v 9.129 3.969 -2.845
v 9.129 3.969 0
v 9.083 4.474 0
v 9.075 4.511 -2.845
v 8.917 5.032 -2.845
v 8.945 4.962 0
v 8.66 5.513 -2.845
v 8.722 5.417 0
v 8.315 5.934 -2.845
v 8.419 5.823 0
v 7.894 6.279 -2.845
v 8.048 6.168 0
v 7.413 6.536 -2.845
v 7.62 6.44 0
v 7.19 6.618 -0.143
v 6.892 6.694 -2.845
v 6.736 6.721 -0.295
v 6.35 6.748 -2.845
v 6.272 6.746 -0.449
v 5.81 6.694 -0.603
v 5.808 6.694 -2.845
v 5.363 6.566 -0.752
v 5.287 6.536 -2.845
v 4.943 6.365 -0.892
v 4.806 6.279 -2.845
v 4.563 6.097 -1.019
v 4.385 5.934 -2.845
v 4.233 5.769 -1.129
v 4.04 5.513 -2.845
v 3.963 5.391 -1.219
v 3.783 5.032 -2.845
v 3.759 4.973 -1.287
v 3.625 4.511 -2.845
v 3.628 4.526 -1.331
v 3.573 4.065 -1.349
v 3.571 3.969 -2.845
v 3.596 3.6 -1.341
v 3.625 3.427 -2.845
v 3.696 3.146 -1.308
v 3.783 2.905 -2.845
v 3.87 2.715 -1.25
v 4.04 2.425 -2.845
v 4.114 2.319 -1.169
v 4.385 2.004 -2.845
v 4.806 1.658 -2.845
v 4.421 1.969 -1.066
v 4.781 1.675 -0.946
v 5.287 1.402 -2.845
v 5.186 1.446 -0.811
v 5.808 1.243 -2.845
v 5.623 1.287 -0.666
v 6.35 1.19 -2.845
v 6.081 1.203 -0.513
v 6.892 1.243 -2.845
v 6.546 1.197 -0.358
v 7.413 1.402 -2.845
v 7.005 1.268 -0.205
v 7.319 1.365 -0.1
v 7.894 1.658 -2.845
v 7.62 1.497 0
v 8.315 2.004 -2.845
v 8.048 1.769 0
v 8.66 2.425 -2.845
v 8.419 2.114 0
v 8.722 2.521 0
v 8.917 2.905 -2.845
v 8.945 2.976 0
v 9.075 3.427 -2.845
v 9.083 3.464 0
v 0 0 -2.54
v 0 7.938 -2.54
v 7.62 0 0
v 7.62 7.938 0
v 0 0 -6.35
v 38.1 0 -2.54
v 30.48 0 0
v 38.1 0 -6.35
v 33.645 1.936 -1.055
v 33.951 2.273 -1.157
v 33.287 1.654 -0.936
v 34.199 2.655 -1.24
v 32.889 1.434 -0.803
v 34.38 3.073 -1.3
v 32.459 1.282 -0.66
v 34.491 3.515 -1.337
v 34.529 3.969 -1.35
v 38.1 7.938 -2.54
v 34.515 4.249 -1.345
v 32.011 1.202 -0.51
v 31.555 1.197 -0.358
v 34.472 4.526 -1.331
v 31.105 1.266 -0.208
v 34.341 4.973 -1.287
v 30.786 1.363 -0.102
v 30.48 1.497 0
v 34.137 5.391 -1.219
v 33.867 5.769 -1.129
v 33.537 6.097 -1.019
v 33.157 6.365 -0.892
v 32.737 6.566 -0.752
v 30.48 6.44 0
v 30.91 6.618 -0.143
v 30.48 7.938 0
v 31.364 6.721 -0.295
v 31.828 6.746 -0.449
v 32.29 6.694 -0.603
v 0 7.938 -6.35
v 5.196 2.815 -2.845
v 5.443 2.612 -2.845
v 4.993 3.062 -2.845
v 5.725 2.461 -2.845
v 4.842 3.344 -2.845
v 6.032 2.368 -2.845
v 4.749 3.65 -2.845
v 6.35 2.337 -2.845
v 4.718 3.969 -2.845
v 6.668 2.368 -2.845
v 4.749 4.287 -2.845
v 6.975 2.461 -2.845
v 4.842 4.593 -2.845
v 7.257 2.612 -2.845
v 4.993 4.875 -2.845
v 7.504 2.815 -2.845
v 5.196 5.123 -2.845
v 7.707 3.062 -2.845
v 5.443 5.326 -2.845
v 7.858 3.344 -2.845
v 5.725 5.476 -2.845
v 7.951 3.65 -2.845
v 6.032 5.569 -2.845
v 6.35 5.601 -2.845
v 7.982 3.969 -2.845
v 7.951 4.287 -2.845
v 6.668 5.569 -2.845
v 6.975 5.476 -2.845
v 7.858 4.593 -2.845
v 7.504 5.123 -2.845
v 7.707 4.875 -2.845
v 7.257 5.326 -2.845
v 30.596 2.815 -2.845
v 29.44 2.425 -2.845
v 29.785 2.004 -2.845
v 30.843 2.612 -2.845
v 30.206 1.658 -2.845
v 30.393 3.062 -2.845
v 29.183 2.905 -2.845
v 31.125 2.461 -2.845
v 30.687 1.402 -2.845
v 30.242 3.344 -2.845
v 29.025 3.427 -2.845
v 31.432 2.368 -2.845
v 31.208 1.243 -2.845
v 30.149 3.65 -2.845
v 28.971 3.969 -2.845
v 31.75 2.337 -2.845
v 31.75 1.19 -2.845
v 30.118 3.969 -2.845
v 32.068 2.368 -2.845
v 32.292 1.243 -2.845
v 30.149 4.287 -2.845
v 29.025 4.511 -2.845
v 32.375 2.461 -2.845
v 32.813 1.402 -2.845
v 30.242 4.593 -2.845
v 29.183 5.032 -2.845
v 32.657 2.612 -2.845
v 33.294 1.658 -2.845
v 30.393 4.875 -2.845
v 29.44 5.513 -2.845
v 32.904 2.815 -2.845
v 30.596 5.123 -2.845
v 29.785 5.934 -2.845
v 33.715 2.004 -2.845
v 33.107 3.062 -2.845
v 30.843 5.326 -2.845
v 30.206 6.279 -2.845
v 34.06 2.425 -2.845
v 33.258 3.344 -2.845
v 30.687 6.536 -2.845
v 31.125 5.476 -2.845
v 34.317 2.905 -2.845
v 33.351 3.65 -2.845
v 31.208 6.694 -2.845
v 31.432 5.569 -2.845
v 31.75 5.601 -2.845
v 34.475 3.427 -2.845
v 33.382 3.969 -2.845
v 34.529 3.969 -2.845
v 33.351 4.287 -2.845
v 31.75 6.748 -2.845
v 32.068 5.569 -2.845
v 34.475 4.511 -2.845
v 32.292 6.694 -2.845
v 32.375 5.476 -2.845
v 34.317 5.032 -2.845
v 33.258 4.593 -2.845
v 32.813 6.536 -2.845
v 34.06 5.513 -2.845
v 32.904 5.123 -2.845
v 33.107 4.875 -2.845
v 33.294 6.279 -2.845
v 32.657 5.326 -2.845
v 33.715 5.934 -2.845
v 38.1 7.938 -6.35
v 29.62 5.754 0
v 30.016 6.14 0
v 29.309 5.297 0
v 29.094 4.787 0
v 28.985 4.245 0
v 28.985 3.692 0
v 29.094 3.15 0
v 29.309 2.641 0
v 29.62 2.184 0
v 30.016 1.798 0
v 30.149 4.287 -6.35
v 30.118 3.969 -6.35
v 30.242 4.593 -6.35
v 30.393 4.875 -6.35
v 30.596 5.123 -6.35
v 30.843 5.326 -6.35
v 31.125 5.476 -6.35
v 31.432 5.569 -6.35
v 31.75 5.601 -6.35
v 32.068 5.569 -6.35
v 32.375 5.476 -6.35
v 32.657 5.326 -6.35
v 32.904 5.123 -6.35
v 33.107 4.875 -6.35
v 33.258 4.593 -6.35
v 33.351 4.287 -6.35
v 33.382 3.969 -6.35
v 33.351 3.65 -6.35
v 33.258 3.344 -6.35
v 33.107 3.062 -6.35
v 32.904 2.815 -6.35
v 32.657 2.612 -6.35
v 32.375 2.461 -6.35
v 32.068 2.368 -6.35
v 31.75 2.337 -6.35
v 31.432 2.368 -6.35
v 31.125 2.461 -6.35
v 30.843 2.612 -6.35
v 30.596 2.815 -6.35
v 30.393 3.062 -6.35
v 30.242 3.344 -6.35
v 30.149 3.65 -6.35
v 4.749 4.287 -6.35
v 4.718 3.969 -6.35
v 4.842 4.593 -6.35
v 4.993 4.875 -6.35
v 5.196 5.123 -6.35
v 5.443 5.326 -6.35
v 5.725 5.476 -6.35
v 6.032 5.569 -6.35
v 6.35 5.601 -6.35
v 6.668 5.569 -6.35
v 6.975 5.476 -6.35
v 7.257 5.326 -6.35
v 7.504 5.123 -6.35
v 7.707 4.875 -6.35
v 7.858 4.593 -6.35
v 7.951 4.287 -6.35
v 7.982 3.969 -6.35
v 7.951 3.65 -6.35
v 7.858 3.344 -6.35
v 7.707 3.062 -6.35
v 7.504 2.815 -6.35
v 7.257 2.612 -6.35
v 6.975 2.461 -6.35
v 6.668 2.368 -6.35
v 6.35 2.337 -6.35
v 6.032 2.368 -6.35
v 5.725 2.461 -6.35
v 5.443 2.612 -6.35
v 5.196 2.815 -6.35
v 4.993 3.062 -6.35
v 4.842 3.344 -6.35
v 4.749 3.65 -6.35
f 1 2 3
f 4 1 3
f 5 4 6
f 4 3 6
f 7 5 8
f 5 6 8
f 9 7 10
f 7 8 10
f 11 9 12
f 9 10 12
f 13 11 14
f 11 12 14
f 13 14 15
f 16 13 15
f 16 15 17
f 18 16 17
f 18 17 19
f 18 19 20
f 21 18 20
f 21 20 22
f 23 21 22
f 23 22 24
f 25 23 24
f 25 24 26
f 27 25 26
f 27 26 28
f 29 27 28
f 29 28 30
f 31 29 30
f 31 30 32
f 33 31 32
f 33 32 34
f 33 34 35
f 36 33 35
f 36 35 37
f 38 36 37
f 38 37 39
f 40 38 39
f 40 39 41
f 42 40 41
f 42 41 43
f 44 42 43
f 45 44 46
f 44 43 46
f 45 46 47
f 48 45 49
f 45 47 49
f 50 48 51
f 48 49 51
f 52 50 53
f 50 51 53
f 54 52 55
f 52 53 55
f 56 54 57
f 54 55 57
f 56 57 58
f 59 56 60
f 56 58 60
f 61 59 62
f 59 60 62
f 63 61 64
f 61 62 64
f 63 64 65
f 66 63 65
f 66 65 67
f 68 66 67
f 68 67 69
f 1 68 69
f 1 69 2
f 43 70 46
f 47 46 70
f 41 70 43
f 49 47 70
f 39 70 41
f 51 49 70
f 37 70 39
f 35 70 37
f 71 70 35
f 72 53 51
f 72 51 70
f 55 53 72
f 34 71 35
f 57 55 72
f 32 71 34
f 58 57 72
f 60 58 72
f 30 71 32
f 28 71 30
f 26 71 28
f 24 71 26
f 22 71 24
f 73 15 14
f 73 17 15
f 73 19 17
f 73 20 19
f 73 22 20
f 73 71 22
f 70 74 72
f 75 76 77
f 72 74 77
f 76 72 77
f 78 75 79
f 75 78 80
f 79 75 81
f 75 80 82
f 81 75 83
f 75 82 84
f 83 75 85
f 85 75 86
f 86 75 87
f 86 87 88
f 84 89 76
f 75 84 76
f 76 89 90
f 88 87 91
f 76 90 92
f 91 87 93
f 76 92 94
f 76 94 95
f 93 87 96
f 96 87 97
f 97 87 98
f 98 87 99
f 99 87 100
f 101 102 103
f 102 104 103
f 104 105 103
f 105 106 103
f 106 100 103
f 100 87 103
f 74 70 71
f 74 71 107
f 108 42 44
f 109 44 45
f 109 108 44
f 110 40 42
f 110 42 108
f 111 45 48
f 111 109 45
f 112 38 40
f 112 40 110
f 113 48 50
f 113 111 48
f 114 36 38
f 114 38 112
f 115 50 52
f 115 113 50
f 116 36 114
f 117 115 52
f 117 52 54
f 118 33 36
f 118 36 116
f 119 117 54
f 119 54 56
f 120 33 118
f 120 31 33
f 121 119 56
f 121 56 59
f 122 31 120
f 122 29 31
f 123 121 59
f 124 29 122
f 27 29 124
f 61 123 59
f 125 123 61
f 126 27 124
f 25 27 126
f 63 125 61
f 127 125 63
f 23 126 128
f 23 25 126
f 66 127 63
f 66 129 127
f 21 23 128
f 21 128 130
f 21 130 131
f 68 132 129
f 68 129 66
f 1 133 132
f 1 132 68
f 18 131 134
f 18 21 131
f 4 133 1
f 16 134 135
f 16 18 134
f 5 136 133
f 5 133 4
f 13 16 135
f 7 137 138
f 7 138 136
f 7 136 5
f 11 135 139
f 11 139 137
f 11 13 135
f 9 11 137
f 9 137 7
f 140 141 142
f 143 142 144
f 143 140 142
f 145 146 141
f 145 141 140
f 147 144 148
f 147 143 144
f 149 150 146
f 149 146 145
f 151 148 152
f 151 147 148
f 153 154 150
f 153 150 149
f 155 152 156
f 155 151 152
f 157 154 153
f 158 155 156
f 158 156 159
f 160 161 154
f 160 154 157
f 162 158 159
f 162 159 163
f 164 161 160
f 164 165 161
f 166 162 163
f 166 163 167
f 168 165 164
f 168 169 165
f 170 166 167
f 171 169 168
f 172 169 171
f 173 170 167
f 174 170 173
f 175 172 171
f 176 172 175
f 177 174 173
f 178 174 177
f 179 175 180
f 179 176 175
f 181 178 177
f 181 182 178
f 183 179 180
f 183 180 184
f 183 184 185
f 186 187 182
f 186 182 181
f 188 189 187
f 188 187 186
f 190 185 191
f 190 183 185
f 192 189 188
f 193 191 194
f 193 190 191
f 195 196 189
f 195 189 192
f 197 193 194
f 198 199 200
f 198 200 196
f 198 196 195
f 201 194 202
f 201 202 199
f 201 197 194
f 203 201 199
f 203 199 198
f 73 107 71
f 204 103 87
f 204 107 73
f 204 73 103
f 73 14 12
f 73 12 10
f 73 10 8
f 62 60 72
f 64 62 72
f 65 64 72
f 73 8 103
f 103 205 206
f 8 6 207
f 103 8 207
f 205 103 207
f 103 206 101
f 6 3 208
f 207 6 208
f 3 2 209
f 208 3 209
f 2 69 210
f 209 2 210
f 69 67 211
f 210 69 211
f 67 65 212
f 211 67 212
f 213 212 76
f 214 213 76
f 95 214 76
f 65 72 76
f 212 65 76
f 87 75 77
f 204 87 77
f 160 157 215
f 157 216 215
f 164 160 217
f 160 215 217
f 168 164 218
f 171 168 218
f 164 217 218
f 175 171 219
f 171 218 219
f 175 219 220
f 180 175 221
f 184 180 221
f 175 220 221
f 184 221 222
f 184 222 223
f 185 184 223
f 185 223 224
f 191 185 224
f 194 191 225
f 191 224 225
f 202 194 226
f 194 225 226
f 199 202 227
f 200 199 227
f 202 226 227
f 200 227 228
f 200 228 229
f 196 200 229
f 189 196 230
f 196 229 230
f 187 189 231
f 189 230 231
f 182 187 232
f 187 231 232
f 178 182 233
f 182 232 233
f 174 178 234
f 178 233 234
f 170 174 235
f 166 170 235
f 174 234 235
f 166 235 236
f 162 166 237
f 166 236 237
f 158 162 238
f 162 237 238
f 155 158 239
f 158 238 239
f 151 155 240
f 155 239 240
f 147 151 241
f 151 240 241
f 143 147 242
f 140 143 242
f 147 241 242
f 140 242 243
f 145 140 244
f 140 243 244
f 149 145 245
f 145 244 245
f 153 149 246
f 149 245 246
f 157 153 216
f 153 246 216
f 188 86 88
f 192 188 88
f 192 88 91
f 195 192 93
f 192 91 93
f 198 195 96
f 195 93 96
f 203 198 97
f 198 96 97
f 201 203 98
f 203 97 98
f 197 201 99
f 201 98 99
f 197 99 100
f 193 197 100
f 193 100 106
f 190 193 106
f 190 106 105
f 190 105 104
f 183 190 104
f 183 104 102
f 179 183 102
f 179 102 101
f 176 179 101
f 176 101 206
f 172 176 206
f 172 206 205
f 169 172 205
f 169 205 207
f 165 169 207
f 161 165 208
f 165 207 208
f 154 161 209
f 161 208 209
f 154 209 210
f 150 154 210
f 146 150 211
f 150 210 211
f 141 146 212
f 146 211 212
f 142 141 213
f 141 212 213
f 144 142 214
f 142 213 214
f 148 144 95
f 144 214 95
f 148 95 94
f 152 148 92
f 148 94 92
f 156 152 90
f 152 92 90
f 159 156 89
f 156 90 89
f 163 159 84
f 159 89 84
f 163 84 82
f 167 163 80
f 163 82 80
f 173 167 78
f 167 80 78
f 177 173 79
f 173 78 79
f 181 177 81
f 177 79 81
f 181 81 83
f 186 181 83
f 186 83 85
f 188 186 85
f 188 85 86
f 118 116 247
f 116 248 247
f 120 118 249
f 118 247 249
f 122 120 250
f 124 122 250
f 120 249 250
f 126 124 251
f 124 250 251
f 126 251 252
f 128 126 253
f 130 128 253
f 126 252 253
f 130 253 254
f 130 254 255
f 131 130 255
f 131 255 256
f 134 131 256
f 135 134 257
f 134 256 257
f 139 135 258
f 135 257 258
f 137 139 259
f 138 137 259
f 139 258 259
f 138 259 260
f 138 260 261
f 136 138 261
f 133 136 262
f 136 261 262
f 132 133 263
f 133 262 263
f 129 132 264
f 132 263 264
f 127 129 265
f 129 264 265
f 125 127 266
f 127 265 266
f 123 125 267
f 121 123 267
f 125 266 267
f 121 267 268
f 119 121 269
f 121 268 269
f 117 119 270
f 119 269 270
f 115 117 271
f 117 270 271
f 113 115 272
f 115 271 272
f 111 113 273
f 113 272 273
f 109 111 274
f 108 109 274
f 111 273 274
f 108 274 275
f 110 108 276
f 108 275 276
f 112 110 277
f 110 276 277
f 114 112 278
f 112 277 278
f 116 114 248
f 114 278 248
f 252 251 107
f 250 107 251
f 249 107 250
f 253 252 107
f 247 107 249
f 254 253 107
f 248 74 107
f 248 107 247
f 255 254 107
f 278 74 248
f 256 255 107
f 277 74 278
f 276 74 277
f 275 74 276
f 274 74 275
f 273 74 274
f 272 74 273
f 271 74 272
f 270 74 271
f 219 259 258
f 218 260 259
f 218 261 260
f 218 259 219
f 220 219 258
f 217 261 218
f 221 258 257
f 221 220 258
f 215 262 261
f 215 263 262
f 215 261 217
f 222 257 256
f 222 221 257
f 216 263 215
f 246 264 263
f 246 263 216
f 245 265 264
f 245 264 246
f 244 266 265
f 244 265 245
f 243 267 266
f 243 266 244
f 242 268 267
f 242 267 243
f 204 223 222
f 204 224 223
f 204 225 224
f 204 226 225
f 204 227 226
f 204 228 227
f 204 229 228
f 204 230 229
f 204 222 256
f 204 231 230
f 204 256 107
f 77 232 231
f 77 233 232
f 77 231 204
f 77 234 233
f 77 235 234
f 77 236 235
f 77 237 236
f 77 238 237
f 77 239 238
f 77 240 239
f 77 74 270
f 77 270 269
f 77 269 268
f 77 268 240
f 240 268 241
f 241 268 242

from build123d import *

# Parameters (mm, degrees)
SKETCH2_W                                      = 38.1
SKETCH2_H                                      = 6.35
BOSS_EXTRUDE2_DEPTH                            = 7.9375
CBORE_FOR_4_SOCKET_HEAD_CAP_SCREW1_D           = 3.2639
CBORE_FOR_4_SOCKET_HEAD_CAP_SCREW1_CBORE_D     = 5.55752
CBORE_FOR_4_SOCKET_HEAD_CAP_SCREW1_CBORE_DEPTH = 2.8448
CUT_EXTRUDE1_DEPTH                             = 12.7


with BuildPart() as part:
    # Sketch2 → Boss-Extrude2 (new body)
    with BuildSketch(Plane(origin=(0, 0, 0), x_dir=(1, 0, 0), z_dir=(0, 1, 0))):
        with Locations((19.05, 3.175)):
            Rectangle(SKETCH2_W, SKETCH2_H)
    extrude(amount=BOSS_EXTRUDE2_DEPTH)

    # CBORE for #4 Socket Head Cap Screw1 (through all)
    with Locations(Plane(origin=(6.35, 3.96875, 0), x_dir=(1, 0, 0), z_dir=(0, 0, 1))):
        with Locations((0, 0), (25.4, 0)):
            CounterBoreHole(CBORE_FOR_4_SOCKET_HEAD_CAP_SCREW1_D / 2, CBORE_FOR_4_SOCKET_HEAD_CAP_SCREW1_CBORE_D / 2, CBORE_FOR_4_SOCKET_HEAD_CAP_SCREW1_CBORE_DEPTH)

    # Sketch4 → Cut-Extrude1 (cut)
    with BuildSketch(Plane(origin=(0, 7.9375, 0), x_dir=(1, 0, 0), z_dir=(0, 1, 0))):
        Polygon((0, 0), (0, 2.54), (7.62, 0), align=None)
        Polygon((38.1, 2.54), (30.48, 0), (38.1, 0), align=None)
    extrude(amount=-CUT_EXTRUDE1_DEPTH, mode=Mode.SUBTRACT)


solid = part.part
